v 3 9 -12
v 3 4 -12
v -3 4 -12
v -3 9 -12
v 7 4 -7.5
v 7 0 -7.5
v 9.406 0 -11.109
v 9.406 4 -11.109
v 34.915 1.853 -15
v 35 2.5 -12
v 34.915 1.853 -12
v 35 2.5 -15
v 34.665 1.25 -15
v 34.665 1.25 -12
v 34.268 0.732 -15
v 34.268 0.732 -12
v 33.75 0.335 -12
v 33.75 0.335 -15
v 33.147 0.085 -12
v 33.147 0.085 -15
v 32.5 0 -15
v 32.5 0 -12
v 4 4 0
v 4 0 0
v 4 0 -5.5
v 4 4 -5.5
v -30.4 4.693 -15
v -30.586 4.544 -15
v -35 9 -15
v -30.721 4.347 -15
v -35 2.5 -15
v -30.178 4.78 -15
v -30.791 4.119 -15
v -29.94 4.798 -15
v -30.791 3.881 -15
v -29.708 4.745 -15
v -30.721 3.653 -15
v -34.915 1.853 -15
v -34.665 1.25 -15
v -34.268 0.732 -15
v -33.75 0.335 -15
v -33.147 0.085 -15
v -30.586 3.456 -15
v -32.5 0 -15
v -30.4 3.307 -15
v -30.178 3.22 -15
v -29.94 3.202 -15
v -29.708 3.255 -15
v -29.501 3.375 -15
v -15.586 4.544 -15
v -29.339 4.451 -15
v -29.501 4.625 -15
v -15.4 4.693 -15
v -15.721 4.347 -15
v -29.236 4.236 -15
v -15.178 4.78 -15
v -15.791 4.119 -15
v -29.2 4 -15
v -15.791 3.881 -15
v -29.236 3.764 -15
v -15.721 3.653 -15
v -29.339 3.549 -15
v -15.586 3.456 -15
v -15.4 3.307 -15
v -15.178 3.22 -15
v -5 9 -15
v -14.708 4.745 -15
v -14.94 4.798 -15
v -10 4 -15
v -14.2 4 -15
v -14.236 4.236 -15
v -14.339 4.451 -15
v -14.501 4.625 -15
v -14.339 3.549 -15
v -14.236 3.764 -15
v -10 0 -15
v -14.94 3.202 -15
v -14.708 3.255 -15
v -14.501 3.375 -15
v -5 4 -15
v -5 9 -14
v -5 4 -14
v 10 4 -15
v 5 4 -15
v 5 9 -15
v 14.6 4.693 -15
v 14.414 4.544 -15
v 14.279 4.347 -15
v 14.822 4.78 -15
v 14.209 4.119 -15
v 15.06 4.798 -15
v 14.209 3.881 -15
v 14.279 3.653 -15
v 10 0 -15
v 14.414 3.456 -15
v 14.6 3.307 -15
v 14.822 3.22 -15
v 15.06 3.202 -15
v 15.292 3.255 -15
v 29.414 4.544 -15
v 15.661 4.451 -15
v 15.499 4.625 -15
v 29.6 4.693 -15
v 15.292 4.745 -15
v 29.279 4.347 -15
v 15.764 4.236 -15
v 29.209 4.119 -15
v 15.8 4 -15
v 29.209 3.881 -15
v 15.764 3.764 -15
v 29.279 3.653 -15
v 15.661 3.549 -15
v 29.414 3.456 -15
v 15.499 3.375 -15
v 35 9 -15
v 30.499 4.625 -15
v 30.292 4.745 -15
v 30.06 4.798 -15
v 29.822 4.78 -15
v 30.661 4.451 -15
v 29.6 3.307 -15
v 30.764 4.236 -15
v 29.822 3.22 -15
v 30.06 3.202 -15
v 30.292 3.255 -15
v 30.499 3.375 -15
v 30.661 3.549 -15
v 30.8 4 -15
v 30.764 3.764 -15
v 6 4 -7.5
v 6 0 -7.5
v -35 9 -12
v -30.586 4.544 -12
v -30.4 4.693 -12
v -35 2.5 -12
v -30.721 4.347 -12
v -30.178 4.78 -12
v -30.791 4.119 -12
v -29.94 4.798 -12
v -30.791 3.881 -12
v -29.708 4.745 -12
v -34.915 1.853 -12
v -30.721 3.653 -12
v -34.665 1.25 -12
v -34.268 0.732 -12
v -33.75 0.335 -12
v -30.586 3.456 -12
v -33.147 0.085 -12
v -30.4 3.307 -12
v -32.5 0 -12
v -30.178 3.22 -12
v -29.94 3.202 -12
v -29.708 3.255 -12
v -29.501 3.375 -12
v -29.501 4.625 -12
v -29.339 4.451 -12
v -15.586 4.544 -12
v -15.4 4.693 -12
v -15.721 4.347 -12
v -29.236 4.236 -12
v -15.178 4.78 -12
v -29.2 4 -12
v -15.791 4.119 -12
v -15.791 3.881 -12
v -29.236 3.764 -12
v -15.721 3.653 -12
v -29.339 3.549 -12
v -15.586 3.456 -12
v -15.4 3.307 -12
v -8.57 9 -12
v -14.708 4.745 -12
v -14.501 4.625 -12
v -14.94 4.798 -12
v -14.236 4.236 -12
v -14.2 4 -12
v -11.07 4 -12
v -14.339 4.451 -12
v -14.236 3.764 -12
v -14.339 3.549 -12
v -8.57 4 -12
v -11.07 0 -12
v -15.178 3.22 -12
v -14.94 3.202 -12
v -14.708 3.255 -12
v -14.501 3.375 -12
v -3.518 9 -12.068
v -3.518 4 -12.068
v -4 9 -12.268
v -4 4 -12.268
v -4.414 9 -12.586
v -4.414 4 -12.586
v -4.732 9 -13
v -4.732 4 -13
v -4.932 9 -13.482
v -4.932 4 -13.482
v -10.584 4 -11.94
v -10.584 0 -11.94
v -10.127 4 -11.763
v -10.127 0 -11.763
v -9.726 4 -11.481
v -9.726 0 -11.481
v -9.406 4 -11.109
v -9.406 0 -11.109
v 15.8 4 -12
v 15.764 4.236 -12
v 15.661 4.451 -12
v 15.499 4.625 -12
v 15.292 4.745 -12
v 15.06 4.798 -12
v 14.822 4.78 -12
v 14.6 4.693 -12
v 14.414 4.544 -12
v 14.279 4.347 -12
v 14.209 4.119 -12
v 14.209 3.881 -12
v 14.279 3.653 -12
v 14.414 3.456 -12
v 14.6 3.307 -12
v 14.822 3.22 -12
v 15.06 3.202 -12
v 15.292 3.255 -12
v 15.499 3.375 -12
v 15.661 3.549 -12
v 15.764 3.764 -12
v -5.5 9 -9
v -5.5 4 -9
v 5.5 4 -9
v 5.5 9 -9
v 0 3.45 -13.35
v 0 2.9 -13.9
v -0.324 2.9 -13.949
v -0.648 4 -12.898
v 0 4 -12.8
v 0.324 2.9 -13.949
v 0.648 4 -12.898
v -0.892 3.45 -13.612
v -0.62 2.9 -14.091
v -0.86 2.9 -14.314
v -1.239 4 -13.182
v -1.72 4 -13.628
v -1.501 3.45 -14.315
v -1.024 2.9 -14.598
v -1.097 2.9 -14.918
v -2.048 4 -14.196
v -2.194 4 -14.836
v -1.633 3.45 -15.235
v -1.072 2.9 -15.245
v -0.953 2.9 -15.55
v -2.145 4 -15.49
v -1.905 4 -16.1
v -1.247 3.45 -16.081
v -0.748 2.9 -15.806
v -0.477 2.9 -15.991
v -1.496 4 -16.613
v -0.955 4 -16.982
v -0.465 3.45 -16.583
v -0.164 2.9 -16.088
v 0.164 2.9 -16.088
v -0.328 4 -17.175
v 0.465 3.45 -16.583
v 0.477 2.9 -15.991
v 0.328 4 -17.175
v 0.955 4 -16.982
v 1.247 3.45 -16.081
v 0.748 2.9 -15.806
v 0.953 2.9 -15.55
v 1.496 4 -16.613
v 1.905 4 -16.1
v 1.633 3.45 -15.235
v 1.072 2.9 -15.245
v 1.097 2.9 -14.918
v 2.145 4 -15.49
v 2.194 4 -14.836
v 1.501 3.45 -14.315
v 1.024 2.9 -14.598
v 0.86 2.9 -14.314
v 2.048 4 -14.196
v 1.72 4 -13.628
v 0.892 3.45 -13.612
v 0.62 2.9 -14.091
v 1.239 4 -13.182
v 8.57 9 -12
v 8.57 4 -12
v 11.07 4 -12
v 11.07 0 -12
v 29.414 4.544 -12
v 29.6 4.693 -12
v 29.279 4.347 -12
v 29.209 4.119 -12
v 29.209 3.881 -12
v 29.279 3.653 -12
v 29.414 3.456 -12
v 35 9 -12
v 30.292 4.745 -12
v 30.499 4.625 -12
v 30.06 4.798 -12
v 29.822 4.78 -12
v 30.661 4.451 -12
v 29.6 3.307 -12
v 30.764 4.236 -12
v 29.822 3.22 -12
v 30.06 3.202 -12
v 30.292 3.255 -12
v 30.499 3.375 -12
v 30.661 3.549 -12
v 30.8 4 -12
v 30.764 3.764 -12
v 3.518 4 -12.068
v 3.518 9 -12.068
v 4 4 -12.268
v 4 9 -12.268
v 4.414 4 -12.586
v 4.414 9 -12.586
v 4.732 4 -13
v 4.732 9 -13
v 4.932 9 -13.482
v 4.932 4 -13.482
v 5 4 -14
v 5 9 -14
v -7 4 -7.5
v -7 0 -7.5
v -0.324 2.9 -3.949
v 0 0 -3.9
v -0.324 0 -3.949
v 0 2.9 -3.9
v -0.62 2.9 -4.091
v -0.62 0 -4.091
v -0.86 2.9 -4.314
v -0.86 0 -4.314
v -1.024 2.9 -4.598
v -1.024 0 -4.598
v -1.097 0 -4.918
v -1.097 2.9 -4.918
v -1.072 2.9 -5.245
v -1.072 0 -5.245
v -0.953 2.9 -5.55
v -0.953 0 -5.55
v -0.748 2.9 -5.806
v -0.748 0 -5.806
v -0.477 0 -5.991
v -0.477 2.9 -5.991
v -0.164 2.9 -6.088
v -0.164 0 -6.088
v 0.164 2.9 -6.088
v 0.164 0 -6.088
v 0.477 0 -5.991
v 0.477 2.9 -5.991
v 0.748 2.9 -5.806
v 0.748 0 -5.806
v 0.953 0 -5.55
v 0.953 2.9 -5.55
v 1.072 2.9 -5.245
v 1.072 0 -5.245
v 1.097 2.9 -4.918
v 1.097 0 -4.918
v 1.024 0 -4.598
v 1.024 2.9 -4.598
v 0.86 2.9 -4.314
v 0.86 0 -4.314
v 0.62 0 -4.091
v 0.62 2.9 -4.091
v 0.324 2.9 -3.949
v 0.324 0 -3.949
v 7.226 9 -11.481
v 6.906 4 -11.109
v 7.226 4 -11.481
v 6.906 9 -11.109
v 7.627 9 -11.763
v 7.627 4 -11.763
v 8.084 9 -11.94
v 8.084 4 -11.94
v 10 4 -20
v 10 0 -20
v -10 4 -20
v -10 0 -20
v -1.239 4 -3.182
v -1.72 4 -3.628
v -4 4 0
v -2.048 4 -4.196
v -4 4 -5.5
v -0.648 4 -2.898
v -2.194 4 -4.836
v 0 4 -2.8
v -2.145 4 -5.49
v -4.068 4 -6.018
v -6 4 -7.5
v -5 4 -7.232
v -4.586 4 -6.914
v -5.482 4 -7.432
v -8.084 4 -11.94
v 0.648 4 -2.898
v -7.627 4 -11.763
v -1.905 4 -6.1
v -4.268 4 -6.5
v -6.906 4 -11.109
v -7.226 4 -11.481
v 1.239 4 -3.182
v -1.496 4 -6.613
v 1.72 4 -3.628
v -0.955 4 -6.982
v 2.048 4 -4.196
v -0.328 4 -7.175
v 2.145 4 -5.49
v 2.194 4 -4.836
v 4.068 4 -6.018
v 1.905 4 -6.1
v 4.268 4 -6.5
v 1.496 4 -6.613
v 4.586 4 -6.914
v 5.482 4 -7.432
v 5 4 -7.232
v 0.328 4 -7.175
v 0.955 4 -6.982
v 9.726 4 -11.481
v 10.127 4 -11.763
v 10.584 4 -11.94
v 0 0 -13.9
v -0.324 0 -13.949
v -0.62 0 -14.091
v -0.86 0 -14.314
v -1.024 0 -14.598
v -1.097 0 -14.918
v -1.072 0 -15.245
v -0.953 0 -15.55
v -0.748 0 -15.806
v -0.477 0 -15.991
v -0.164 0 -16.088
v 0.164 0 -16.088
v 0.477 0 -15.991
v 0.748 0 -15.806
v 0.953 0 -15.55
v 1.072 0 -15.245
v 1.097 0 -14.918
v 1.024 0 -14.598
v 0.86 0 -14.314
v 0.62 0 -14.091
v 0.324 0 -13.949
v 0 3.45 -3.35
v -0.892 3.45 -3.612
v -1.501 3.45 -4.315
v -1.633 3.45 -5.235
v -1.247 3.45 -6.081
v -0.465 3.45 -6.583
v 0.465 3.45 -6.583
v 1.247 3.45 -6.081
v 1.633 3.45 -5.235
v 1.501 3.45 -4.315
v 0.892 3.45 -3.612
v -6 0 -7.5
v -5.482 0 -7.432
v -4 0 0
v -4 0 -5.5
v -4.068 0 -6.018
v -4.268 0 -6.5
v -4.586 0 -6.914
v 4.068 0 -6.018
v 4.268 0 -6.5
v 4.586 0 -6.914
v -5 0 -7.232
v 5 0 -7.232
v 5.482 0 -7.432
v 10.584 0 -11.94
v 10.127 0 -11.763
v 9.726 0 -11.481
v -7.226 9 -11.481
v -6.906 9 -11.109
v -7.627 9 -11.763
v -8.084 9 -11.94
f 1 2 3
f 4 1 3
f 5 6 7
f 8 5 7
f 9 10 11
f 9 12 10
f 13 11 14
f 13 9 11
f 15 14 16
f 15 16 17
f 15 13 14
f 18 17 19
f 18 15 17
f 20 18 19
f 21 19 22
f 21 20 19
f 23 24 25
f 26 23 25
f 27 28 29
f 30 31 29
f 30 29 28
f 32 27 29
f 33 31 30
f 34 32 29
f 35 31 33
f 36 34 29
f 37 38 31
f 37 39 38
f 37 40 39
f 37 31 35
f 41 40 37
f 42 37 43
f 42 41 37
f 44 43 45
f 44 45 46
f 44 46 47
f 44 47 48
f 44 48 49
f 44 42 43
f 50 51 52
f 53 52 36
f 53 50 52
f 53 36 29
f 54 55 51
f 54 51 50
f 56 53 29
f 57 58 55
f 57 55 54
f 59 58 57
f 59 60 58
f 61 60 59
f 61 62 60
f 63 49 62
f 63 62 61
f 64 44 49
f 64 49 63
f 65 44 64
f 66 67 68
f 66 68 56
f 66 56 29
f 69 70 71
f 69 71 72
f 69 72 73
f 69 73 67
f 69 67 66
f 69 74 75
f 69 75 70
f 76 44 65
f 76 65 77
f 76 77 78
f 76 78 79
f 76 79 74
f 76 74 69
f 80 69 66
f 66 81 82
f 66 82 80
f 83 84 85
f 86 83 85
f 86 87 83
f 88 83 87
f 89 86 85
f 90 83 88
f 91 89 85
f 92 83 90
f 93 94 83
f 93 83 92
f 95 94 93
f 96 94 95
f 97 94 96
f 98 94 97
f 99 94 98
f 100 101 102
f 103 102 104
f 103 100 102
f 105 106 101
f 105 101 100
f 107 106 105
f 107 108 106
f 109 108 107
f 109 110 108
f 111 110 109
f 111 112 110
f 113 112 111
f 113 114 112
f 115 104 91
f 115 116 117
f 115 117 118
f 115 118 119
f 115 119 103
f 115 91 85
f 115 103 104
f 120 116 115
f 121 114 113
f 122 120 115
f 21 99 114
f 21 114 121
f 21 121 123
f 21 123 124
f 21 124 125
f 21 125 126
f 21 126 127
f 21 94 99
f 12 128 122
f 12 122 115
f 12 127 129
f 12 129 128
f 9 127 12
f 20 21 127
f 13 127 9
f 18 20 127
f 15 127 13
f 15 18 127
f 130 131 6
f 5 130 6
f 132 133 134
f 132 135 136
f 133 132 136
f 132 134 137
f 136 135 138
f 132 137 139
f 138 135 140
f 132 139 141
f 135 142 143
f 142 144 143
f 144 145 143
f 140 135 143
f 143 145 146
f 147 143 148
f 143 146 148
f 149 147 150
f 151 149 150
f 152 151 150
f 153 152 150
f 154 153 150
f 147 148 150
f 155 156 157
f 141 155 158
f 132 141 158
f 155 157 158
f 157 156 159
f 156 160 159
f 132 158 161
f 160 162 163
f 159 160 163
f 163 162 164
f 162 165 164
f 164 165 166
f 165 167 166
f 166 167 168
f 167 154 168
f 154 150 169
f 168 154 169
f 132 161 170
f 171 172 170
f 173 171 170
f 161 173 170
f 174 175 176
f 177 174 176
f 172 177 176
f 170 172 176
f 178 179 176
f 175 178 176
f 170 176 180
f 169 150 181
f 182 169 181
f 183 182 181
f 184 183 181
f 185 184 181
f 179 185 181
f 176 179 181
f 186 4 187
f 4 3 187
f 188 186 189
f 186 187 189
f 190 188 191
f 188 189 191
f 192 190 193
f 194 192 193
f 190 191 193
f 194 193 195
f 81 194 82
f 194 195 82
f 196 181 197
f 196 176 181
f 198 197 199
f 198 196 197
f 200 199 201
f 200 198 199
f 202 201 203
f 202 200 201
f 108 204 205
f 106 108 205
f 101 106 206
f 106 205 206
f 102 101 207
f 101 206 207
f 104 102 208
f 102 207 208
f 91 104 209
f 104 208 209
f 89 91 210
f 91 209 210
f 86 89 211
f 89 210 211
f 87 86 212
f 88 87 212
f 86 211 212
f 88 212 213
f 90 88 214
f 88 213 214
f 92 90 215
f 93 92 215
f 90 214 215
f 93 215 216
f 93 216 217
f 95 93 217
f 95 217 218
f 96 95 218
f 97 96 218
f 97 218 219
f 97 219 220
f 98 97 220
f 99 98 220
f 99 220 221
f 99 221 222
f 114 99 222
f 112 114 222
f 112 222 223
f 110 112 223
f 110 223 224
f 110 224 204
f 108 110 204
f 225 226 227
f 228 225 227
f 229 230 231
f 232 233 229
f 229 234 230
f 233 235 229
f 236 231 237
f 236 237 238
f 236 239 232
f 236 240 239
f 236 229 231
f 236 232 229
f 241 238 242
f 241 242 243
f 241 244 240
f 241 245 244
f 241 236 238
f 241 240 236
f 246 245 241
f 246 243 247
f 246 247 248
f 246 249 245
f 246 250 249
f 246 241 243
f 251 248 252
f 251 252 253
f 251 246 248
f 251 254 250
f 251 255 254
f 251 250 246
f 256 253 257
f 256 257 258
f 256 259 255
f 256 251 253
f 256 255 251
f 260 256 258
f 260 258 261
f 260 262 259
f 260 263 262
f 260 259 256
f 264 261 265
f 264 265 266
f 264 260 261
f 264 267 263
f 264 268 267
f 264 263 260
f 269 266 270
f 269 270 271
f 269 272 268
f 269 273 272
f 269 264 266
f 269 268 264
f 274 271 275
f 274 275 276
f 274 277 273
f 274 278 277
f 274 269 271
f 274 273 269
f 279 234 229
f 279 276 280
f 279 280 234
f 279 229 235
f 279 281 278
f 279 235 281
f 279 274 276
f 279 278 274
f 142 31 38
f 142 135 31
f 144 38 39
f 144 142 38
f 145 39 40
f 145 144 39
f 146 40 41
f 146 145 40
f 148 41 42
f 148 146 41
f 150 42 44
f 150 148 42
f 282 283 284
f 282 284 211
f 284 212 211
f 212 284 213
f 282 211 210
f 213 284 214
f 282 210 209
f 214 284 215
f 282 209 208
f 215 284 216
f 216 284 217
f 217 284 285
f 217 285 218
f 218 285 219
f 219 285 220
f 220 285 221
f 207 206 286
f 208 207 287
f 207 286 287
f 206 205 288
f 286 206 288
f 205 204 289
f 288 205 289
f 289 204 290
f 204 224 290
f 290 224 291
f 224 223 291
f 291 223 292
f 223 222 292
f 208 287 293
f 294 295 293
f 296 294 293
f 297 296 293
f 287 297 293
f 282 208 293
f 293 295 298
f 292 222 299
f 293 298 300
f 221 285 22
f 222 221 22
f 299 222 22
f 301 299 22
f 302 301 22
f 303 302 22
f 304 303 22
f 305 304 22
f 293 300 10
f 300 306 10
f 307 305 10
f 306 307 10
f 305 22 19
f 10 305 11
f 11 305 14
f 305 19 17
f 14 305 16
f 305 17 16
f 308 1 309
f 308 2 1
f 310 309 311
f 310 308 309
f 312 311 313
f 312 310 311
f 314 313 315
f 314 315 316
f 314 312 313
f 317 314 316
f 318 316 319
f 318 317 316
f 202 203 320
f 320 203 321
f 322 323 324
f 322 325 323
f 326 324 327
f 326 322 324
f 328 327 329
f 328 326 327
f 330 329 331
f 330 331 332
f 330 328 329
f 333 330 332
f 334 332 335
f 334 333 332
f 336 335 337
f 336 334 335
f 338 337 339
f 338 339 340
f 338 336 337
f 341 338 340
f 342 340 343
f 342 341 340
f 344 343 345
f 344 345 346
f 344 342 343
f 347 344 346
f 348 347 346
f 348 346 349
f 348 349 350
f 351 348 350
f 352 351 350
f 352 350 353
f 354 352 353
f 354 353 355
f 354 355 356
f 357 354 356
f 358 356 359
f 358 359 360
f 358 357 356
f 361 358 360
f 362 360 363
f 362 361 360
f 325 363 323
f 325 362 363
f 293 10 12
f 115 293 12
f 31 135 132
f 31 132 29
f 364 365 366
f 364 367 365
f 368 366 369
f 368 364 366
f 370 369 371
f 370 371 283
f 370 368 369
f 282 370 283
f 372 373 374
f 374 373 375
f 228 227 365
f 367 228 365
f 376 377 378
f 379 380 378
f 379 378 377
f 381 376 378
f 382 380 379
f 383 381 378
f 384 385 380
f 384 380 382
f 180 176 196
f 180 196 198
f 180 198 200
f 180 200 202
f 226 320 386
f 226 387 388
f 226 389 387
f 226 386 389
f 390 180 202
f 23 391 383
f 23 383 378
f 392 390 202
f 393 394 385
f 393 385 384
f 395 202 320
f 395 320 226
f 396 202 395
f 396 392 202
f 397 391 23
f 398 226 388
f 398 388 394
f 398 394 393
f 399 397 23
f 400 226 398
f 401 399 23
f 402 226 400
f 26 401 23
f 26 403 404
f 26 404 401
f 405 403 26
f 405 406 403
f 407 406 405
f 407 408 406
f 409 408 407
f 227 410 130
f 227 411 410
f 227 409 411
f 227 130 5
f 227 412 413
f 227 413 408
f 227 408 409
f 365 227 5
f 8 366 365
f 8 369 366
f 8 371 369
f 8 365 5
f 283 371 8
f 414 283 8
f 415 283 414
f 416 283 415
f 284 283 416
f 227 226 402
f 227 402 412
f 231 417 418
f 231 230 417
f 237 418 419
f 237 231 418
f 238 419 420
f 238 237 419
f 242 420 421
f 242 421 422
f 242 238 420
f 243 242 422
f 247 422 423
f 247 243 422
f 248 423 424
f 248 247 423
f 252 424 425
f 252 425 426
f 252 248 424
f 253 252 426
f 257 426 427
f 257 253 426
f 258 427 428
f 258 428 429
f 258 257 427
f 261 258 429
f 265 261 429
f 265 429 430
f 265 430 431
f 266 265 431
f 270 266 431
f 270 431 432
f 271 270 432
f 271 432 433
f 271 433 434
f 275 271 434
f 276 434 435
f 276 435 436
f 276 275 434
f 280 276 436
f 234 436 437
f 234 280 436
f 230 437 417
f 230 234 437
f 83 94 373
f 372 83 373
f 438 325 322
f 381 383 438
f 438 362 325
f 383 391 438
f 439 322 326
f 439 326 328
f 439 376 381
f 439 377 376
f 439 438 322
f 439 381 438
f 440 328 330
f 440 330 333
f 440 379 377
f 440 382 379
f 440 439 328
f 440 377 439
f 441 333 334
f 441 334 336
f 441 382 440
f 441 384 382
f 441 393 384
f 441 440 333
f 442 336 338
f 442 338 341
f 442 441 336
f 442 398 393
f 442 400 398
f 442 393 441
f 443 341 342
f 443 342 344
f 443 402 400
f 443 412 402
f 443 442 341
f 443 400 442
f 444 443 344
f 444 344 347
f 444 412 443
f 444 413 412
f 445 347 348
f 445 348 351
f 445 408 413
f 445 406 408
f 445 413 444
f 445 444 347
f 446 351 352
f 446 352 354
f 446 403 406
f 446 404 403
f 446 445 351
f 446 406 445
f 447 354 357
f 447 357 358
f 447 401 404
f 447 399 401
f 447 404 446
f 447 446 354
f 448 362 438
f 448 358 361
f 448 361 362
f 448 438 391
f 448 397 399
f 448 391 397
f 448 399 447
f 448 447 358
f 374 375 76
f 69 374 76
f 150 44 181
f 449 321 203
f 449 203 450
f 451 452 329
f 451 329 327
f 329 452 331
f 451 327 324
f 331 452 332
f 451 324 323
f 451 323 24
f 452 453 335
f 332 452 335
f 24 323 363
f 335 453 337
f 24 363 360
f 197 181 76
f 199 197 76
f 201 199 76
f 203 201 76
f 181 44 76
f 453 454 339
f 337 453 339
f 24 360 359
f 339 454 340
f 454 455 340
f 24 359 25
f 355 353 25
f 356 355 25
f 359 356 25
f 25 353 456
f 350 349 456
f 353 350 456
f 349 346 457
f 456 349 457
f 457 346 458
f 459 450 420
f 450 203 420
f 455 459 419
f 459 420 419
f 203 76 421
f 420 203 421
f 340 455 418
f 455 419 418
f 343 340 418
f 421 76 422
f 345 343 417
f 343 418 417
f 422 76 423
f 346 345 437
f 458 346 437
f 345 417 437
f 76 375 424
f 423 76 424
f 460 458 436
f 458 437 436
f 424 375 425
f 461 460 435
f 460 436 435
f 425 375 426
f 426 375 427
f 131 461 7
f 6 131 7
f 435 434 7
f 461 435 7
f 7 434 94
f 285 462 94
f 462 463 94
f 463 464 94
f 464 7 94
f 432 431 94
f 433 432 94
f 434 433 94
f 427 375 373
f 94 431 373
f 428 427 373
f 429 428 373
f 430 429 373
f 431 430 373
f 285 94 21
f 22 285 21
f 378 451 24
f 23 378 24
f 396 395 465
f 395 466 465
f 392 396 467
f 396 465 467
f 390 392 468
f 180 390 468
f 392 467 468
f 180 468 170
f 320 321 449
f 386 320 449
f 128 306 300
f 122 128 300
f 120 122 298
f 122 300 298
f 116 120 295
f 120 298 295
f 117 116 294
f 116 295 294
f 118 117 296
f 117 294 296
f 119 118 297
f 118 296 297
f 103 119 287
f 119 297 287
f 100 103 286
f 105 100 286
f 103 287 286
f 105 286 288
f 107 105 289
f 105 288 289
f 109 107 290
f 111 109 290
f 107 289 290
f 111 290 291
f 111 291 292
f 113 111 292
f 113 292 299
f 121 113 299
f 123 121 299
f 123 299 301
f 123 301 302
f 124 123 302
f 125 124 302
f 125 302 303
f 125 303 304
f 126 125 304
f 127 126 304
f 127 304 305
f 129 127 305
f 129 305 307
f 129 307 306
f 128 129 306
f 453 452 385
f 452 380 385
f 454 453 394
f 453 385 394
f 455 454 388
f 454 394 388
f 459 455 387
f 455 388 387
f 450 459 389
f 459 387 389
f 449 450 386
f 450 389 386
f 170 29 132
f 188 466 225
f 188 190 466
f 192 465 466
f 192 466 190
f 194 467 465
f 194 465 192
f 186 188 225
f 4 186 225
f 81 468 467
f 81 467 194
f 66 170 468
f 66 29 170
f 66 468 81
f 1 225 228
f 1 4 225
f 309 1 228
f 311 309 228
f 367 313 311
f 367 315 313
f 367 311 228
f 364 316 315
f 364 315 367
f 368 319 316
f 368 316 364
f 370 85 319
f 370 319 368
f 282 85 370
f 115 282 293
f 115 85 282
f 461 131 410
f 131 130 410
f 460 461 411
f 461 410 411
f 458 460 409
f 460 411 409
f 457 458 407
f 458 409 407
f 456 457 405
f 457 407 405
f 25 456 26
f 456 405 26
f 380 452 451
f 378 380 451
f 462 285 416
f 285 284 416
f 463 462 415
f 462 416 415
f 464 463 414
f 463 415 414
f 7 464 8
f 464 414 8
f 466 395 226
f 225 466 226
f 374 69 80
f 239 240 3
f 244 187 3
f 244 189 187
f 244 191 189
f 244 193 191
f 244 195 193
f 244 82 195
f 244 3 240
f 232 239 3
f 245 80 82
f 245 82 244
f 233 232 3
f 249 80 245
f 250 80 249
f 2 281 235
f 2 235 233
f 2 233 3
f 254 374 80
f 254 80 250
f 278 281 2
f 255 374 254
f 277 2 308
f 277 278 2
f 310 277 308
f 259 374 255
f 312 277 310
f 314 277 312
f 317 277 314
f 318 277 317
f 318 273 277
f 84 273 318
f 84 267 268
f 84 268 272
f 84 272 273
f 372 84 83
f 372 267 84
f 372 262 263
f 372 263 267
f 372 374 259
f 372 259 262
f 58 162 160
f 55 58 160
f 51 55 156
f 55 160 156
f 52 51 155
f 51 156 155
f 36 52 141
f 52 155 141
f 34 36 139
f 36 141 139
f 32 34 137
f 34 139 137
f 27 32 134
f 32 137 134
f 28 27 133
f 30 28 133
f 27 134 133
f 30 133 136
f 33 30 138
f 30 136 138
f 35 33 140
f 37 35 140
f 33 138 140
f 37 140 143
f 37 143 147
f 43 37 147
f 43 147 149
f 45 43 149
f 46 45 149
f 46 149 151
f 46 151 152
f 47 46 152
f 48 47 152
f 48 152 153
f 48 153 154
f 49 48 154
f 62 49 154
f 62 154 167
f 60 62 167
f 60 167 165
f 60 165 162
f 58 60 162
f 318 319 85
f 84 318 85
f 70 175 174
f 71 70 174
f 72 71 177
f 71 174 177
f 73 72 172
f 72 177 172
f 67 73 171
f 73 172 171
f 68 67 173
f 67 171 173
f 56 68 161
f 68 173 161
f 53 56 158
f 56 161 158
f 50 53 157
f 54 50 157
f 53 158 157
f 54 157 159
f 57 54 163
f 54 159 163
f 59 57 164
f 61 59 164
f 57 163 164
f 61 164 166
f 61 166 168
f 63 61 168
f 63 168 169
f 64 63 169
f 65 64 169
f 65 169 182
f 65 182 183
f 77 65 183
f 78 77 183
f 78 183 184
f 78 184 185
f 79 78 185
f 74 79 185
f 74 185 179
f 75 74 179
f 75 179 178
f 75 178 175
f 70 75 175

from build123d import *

# Parameters (mm, degrees)
BOSS_EXTRUDE1_DEPTH                          = 4
SKETCH2_W                                    = 70
SKETCH2_H                                    = 3
BOSS_EXTRUDE2_DEPTH                          = 5
CSK_FOR_M2_COUNTERSUNK_FLAT_HEAD_SCR_2_COUNT = 2
CSK_FOR_M2_COUNTERSUNK_FLAT_HEAD_SCR_2_PITCH = 10
SKETCH5_W                                    = 10
SKETCH5_H                                    = 3
CUT_EXTRUDE1_DEPTH                           = 5
FILLET1_R                                    = 2.5
M2_TAPPED_HOLE1_D                            = 1.6
M2_TAPPED_HOLE1_DEPTH                        = 3
BOSS_EXTRUDE3_DEPTH                          = 5
FILLET2_R                                    = 2


with BuildPart() as part:
    # Sketch1 → Boss-Extrude1 (new body)
    with BuildSketch(Plane(origin=(0, 0, 0), x_dir=(1, 0, 0), z_dir=(0, 1, 0))):
        Polygon((-4, 0), (4, 0), (4, 7.5), (7, 7.5), (10, 12), (35, 12), (35, 15), (10, 15), (10, 20), (-10, 20), (-10, 15), (-35, 15), (-35, 12), (-10, 12), (-7, 7.5), (-4, 7.5), align=None)
    extrude(amount=BOSS_EXTRUDE1_DEPTH)

    # Sketch2 → Boss-Extrude2 (add)
    with BuildSketch(Plane(origin=(0, 4, 0), x_dir=(1, 0, 0), z_dir=(0, 1, 0))):
        with Locations((0, 13.5)):
            Rectangle(SKETCH2_W, SKETCH2_H)
    extrude(amount=BOSS_EXTRUDE2_DEPTH)

    # Sketch4 → CSK for M2 Countersunk Flat Head Screw1 (revolve, cut)
    with BuildSketch(Plane(origin=(0, 4, -15), x_dir=(0, 0, 1), z_dir=(1, 0, 0))):
        Polygon((0, 0), (0, 4), (1.1, 4), (1.1, 1.1), (2.2, 0), align=None)
    csk_for_m2_countersunk_flat_head_screw1 = revolve(axis=Axis((0, 10.35, -15), (0, -1, 0)), mode=Mode.SUBTRACT)

    # CSK for M2 Countersunk Flat Head Scr 2: CSK for M2 Countersunk Flat Head Screw1 ×2
    with Locations(*[(0, 0, i * CSK_FOR_M2_COUNTERSUNK_FLAT_HEAD_SCR_2_PITCH) for i in range(1, CSK_FOR_M2_COUNTERSUNK_FLAT_HEAD_SCR_2_COUNT)]):
        add(csk_for_m2_countersunk_flat_head_screw1, mode=Mode.SUBTRACT)

    # Sketch5 → Cut-Extrude1 (cut)
    with BuildSketch(Plane(origin=(0, 9, 0), x_dir=(1, 0, 0), z_dir=(0, 1, 0))):
        with Locations((0, 13.5)):
            Rectangle(SKETCH5_W, SKETCH5_H)
    extrude(amount=-CUT_EXTRUDE1_DEPTH, mode=Mode.SUBTRACT)

    # Fillet1
    fillet1_edges = [part.edges().sort_by_distance(p)[0] for p in [
        (-35, 0, -13.5),
        (35, 0, -13.5),
    ]]
    fillet(fillet1_edges, radius=FILLET1_R)

    # M2 Tapped Hole1
    with Locations(Plane(origin=(0, 0, -15), x_dir=(-1, 0, 0), z_dir=(0, 0, -1))):
        with Locations((30, 4), (15, 4), (-15, 4), (-30, 4)):
            Hole(M2_TAPPED_HOLE1_D / 2, depth=M2_TAPPED_HOLE1_DEPTH)

    # Sketch9 → Boss-Extrude3 (add)
    with BuildSketch(Plane(origin=(0, 4, 0), x_dir=(1, 0, 0), z_dir=(0, 1, 0))):
        Polygon((-7.5, 12), (-5.5, 9), (5.5, 9), (7.5, 12), align=None)
    extrude(amount=BOSS_EXTRUDE3_DEPTH)

    # Fillet2
    fillet2_edges = [part.edges().sort_by_distance(p)[0] for p in [
        (7.5, 6.5, -12),
        (-7.5, 6.5, -12),
        (-4, 2, -7.5),
        (-10, 2, -12),
        (10, 2, -12),
        (4, 2, -7.5),
        (-5, 6.5, -12),
        (5, 6.5, -12),
    ]]
    fillet(fillet2_edges, radius=FILLET2_R)


solid = part.part
